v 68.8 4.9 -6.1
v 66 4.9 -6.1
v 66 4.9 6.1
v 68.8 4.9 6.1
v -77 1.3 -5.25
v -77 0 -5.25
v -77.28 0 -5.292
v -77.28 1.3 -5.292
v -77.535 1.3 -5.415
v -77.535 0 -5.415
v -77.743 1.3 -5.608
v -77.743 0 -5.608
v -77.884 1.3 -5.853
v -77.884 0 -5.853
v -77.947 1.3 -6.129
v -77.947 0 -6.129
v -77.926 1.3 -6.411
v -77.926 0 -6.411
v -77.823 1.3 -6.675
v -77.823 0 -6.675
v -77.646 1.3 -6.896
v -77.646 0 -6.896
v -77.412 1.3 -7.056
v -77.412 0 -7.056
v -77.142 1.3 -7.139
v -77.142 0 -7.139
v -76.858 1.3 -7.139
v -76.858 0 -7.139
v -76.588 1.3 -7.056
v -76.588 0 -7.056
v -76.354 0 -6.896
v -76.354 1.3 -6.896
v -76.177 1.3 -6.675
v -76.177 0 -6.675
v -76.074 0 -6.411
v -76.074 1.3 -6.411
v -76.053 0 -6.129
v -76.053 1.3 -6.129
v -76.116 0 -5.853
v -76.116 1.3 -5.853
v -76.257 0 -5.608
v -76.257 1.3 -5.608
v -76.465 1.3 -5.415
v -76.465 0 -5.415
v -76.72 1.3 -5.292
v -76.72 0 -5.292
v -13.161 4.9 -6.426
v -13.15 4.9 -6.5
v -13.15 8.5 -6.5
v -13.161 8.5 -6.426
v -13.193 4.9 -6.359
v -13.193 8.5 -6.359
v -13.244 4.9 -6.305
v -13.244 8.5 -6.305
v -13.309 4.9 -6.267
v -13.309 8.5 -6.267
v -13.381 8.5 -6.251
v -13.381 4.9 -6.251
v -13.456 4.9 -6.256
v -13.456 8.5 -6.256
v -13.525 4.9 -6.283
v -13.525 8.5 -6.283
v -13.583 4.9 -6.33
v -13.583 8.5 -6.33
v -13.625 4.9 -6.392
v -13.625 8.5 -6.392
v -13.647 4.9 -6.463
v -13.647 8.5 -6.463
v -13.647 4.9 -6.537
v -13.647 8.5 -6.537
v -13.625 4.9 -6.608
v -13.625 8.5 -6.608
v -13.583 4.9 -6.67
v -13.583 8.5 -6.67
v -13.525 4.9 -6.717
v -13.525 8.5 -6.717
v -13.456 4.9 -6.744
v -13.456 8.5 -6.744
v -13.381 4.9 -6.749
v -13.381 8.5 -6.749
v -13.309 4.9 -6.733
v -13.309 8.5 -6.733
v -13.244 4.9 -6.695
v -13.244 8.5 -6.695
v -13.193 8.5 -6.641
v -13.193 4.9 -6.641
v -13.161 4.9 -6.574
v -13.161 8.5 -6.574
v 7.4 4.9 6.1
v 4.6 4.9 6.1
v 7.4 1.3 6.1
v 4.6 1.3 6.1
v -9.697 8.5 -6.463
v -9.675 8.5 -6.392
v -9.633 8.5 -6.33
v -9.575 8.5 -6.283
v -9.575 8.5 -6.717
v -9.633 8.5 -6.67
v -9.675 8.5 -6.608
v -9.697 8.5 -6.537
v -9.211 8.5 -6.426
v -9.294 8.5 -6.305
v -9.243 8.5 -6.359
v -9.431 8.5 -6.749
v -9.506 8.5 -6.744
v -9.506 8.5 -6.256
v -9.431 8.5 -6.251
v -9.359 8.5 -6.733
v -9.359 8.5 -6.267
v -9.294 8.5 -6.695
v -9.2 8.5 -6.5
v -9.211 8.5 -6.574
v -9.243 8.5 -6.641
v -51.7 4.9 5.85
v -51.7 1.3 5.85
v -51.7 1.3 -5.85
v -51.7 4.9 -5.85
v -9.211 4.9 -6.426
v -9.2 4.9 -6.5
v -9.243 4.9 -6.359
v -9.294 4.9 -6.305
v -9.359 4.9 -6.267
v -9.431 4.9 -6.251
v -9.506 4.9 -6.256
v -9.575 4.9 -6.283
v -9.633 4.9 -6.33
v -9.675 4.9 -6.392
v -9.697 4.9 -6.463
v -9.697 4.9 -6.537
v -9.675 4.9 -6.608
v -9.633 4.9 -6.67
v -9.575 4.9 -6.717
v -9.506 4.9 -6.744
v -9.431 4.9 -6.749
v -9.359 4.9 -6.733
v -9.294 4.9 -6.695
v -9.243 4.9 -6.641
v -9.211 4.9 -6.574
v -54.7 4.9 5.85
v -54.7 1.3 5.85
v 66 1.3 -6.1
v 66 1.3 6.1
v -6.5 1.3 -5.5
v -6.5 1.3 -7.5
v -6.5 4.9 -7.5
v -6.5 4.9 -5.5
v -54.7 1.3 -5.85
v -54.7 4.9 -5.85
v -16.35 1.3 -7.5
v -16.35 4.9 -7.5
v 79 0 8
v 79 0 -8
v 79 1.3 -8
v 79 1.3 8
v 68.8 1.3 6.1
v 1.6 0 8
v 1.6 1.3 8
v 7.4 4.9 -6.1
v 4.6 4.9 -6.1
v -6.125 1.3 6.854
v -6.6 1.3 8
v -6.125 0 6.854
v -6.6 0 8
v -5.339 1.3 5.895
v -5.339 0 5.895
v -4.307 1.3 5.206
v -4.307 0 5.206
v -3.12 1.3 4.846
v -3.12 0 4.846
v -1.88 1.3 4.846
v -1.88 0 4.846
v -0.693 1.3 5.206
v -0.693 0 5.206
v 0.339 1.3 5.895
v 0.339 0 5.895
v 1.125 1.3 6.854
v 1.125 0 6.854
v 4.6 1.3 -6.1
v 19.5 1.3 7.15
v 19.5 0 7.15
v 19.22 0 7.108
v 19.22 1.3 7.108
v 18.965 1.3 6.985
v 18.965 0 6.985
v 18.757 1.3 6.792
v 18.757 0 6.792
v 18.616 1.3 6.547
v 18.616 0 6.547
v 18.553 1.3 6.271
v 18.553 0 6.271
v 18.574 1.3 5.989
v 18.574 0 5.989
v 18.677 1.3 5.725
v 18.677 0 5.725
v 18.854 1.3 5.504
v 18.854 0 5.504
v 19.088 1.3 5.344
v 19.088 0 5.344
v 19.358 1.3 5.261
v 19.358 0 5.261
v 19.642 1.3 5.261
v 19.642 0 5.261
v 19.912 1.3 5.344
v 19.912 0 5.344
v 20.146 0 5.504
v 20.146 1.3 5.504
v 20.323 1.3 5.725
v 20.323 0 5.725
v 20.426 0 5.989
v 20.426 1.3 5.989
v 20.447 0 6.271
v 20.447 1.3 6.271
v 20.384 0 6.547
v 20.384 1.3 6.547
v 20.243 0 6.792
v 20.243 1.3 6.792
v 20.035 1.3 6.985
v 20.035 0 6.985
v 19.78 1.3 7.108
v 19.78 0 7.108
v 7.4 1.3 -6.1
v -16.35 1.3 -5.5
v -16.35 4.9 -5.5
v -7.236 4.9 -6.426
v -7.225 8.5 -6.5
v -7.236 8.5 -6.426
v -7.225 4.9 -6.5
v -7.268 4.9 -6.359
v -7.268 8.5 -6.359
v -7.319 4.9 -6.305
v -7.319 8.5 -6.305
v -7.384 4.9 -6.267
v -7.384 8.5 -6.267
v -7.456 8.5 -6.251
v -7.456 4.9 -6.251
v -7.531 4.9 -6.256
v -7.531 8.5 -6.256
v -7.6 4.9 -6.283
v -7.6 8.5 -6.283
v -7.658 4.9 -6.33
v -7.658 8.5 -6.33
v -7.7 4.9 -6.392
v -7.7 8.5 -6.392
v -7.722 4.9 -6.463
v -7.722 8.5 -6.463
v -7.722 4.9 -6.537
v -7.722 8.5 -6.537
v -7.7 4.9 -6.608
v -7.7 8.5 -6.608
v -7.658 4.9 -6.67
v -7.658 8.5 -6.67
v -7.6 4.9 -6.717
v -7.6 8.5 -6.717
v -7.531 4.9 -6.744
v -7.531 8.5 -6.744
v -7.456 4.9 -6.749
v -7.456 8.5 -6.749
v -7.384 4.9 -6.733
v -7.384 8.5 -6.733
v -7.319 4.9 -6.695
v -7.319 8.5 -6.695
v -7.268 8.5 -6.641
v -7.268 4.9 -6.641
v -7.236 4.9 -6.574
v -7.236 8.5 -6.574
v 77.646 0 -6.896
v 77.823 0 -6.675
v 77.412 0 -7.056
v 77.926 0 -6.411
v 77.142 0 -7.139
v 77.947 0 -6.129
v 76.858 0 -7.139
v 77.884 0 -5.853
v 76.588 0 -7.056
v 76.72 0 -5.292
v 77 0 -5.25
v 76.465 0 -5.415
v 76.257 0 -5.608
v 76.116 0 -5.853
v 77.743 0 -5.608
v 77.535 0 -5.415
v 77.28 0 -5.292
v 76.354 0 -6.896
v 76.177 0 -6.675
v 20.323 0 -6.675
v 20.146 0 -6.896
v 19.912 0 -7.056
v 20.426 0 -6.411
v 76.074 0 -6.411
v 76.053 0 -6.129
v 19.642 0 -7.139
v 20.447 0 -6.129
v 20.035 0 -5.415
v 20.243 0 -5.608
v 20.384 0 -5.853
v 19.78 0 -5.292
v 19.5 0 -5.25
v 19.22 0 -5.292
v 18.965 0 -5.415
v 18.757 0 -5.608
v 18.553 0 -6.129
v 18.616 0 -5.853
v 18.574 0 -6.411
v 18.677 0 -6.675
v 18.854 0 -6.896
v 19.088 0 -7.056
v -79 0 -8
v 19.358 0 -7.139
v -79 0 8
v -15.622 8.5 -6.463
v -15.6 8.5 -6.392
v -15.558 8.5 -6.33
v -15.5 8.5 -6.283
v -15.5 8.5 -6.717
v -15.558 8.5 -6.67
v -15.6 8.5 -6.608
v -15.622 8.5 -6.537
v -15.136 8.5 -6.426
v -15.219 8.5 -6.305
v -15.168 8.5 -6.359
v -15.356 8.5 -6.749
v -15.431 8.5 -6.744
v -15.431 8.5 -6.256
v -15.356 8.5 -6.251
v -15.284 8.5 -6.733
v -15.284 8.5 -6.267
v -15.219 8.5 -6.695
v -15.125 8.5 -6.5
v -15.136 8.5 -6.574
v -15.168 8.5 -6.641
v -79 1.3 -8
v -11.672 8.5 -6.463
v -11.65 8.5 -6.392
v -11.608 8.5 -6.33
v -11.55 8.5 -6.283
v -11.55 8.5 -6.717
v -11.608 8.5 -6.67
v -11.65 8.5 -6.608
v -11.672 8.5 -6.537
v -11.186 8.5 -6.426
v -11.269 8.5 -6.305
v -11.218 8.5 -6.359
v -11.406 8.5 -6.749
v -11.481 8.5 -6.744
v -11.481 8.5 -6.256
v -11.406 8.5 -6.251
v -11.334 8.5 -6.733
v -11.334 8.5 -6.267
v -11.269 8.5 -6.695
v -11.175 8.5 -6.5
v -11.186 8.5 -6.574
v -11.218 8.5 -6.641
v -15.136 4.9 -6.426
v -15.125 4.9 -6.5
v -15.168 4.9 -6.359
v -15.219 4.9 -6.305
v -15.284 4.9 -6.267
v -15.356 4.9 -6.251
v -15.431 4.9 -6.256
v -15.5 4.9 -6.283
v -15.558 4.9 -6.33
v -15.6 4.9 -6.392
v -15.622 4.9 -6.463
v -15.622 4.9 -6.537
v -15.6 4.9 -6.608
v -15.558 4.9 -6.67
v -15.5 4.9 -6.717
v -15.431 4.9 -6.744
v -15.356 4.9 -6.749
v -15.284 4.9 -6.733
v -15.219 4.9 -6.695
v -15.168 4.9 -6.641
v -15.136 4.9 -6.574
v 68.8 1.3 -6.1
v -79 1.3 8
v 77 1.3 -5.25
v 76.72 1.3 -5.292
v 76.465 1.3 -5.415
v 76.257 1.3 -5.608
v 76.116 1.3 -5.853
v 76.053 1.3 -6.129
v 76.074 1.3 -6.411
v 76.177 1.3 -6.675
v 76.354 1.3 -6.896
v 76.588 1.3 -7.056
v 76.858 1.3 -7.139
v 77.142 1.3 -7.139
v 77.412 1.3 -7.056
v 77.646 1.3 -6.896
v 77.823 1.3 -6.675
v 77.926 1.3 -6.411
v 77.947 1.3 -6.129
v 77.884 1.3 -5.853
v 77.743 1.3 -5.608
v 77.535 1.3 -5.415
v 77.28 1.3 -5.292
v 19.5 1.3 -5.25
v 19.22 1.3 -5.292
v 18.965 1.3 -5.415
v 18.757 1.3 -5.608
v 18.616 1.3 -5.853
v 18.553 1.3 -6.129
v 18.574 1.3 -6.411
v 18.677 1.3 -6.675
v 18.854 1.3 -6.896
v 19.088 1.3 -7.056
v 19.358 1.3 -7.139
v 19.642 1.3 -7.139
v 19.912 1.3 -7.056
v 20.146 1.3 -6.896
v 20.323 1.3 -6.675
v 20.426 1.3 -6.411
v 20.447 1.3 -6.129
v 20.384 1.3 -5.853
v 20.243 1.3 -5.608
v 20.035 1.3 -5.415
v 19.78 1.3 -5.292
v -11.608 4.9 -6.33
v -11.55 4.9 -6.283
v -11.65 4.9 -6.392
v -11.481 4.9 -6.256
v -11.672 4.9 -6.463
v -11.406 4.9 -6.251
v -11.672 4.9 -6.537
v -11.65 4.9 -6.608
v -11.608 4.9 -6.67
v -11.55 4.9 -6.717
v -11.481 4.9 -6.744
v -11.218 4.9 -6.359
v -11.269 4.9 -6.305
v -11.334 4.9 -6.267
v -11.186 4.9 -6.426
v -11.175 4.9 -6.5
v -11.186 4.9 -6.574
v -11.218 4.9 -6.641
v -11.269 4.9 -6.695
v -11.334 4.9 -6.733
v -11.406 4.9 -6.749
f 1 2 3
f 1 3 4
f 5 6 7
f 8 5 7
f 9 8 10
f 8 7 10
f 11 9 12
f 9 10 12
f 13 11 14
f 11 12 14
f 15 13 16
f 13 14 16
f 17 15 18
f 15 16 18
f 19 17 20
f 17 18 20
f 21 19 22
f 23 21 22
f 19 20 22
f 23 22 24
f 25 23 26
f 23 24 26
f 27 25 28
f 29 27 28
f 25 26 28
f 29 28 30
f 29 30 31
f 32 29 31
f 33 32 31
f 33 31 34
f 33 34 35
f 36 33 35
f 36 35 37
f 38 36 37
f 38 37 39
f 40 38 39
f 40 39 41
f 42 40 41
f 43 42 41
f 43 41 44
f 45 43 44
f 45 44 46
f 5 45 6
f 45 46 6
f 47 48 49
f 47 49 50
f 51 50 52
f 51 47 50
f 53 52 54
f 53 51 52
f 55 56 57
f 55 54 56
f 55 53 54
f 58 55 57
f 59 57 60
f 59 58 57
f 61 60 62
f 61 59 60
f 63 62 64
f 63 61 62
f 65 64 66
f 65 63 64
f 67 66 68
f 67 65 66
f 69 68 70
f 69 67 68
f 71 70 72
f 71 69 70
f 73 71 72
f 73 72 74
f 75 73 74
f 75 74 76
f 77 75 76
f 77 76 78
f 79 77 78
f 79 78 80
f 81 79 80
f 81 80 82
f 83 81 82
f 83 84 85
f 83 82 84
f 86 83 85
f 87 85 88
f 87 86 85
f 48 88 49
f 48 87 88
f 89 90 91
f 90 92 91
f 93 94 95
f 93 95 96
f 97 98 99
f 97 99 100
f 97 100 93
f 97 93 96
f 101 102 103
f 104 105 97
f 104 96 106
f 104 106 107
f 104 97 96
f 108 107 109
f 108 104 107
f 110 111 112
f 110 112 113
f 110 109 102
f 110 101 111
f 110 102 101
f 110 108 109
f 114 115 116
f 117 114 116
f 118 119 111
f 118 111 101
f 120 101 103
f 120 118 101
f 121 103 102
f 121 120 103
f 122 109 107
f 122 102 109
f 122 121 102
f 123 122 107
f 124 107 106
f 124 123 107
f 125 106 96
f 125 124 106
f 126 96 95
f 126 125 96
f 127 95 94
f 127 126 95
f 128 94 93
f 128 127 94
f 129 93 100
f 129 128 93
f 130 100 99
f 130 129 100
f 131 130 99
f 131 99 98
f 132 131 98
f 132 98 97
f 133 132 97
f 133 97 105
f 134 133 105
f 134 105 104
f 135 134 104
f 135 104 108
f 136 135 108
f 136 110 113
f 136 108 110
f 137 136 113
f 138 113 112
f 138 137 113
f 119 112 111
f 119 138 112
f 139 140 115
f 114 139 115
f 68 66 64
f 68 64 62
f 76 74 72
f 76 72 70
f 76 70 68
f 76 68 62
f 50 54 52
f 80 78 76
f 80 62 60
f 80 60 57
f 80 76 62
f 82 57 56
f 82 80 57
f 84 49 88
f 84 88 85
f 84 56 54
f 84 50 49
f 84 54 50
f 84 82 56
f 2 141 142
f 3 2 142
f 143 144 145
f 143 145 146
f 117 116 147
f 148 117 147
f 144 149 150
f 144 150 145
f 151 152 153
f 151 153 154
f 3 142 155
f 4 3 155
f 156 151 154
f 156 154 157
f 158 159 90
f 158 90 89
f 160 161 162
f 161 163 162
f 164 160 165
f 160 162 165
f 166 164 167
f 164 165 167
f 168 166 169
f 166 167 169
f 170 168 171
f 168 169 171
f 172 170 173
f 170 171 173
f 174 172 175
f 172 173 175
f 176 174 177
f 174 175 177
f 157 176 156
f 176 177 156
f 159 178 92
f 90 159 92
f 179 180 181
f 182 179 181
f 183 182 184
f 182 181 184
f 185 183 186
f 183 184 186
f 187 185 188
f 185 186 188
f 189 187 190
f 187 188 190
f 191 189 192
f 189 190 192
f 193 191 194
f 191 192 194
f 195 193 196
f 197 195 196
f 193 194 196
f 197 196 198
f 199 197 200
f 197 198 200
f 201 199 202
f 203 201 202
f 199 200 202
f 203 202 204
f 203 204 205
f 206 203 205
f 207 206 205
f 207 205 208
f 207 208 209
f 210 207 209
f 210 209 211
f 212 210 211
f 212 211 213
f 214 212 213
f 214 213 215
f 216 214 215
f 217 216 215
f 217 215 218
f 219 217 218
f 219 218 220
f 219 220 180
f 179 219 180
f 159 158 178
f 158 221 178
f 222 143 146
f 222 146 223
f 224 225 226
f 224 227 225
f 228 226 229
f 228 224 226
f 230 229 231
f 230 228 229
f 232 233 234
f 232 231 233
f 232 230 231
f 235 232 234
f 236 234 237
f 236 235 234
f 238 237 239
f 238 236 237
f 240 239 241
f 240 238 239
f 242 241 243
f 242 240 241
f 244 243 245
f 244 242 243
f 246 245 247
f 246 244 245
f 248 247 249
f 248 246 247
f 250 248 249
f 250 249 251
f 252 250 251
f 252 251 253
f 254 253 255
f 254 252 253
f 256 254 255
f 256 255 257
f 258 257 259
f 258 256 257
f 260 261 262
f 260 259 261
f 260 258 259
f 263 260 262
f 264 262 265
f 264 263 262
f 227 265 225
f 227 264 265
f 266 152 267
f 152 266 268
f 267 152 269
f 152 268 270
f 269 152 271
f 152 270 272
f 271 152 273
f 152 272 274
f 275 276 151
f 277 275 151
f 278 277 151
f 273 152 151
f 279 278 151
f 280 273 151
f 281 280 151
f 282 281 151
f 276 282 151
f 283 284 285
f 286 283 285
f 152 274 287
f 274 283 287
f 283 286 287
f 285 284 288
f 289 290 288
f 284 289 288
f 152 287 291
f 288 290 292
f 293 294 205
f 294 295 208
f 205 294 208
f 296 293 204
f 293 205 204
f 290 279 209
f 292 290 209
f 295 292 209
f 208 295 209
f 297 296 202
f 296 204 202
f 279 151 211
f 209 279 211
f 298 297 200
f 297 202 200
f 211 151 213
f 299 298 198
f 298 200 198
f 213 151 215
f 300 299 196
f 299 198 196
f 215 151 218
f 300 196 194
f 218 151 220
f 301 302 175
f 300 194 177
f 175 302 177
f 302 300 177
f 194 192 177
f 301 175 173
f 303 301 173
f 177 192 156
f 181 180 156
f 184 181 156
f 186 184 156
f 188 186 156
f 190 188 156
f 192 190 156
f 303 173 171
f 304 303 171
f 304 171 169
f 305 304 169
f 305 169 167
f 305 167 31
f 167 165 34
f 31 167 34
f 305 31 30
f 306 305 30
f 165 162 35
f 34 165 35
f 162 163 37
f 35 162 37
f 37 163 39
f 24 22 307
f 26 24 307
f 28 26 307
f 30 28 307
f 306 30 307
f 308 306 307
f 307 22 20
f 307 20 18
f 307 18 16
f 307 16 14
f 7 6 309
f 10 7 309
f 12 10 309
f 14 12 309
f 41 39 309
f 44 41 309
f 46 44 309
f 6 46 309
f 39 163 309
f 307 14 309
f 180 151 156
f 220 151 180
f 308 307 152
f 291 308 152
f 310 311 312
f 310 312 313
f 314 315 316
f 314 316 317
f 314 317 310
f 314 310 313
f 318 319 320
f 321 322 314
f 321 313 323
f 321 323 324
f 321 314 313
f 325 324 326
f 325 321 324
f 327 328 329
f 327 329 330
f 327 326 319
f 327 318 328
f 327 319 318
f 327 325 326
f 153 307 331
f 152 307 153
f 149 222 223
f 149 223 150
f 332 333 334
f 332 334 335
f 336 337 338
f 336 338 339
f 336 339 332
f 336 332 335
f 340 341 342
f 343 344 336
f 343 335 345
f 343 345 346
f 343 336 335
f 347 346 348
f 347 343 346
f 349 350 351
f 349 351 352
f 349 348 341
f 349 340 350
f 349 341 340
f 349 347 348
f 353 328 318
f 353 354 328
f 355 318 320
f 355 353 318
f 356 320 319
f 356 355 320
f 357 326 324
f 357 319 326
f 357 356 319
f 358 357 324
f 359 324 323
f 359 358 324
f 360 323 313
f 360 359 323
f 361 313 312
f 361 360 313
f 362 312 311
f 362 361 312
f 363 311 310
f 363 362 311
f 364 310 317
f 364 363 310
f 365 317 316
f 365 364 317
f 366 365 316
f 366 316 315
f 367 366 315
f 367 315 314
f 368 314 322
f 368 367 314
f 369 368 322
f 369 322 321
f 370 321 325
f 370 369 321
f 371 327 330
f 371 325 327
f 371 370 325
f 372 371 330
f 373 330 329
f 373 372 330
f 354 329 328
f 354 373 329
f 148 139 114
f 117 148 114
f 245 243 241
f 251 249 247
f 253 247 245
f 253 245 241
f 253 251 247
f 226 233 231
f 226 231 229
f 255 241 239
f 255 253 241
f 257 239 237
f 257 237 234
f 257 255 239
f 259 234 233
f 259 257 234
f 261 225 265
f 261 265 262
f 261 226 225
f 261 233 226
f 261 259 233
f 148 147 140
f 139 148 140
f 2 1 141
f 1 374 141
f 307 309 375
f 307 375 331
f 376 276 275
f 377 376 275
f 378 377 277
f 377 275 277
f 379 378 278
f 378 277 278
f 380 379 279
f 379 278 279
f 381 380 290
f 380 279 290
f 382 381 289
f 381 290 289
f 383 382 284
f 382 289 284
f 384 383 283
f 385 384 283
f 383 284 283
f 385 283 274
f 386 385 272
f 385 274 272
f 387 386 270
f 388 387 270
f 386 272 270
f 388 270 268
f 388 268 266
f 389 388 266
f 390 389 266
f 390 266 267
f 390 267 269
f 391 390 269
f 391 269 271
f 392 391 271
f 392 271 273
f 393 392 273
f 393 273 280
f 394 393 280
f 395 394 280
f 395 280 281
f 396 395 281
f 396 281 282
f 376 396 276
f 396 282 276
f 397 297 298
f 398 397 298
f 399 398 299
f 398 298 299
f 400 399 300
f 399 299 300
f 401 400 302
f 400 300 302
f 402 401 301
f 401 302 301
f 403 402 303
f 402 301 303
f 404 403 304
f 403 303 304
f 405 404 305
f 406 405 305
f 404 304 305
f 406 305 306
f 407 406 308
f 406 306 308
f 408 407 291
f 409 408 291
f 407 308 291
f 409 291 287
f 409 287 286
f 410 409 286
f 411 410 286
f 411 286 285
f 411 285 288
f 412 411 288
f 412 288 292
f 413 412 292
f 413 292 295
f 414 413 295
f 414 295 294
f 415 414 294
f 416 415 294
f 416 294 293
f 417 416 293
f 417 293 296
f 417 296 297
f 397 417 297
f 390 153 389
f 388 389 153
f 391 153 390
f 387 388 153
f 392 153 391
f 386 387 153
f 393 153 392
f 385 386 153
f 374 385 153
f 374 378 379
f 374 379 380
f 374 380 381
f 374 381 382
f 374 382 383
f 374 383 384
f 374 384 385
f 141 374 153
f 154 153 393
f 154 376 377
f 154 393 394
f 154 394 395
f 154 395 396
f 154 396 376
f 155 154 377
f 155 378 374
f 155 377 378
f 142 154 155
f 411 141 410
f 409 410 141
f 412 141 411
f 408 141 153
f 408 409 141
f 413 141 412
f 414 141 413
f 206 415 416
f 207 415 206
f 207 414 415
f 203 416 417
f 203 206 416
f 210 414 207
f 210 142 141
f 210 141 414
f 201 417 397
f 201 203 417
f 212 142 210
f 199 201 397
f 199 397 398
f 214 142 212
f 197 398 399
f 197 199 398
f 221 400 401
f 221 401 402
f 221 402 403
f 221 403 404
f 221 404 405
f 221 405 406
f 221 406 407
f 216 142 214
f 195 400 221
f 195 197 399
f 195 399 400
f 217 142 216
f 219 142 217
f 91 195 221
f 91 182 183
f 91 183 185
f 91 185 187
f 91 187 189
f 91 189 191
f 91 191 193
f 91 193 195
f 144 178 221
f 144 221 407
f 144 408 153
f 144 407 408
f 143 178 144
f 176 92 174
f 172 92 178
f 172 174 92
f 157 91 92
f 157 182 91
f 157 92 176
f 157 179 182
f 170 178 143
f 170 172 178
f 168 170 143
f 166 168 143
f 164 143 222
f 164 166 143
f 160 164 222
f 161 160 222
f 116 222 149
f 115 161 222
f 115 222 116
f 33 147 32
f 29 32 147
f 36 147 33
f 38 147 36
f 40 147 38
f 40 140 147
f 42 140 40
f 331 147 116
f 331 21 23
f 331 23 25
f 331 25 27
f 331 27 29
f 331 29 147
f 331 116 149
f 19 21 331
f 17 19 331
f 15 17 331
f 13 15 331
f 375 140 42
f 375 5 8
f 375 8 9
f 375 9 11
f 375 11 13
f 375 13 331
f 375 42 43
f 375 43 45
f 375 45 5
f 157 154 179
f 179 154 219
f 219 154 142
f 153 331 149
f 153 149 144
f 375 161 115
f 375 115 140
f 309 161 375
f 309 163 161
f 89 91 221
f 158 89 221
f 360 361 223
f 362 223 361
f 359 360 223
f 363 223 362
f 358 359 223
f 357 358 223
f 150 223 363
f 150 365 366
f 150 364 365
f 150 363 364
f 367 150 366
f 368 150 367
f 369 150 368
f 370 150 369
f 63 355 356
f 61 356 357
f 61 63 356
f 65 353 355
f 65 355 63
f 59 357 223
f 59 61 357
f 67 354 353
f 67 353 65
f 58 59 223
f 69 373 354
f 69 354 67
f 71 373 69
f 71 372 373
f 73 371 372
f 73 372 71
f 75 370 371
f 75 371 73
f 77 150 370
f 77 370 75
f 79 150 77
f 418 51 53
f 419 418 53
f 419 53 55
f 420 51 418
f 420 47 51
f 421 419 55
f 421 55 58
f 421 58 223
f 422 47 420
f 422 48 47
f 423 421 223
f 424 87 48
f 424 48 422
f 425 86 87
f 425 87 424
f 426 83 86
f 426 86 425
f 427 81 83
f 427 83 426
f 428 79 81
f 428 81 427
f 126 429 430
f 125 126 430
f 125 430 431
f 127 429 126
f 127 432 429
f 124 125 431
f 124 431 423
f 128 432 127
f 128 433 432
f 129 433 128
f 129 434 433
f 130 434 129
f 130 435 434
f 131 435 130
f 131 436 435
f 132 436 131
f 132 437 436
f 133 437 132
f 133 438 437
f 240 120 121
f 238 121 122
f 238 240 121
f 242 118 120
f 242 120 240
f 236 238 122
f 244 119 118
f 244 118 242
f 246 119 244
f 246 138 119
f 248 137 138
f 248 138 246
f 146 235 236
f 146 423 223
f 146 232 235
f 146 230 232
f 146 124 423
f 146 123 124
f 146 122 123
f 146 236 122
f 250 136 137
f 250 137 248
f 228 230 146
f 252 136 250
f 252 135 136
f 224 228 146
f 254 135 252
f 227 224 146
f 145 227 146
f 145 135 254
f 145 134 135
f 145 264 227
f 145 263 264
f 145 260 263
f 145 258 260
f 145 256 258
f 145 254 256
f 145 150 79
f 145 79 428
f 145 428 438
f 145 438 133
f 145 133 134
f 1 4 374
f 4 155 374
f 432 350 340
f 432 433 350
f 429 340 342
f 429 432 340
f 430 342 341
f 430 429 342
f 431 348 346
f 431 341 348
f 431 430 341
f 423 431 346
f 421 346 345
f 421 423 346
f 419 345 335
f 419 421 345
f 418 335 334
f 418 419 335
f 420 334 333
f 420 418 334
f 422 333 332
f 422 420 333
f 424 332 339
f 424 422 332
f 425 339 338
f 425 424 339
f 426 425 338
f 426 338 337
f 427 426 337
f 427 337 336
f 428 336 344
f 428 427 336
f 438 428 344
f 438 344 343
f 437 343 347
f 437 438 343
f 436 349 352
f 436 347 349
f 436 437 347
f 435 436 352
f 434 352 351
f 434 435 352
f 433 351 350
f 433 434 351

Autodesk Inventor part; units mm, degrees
ref_plane "YZ Plane" through (0, 0, 0) normal (1, 0, 0) x (0, 1, 0)
ref_plane "XZ Plane" through (0, 0, 0) normal (0, 1, 0) x (-1, 0, 0)
ref_plane "XY Plane" through (0, 0, 0) normal (0, 0, 1) x (1, 0, 0)
sketch "Sketch1" plane through (0, 0, 0) normal (0, 1, 0) x (-1, 0, 0)
  line L0 (79, -8) -> (-79, -8)
  line L1 (-79, -8) -> (-79, 8)
  line L2 (79, 8) -> (79, -8)
  line L3 (79, -8) -> (-79, 8) construction
  line L4 (-79, -8) -> (79, 8) construction
  arc A0 (-1.6, 8) -> (6.6, 8) centre (2.5, 9.0266) ccw
  line L5 (0, -8) -> (0, 2.5887)
  line L6 (2.5, 9.0266) -> (2.5, 15.2917) construction
  line L7 (7.7992, 4.8) -> (-2.6665, 4.8) construction
  line L8 (-79, 8) -> (-1.6, 8)
  line L9 (6.6, 8) -> (79, 8)
  point P0 (0, 0)
  dimension "d0" = 158
  dimension "d1" = 16
  dimension "d2" = 76.5
  dimension "d3" = 8.2
  dimension "d5" = 3.2
extrude "Extrusion1" add sketch "Sketch1" along normal blind 1.3
sketch "Sketch2" plane through (0, 1.3, 0) normal (0, 1, 0) x (1, 0, 0)
  line L0 (79, 8) -> (-79, 8) projected
  line L1 (-79, 8) -> (-79, -8) projected
  line L2 (-79, -8) -> (-6.6, -8) projected
  arc A0 (1.6, -8) -> (-6.6, -8) centre (-2.5, -9.0266) ccw projected
  line L3 (1.6, -8) -> (79, -8) projected
  line L4 (79, -8) -> (79, 8) projected
  line L5 (-77, 6.2) -> (77, 6.2) construction
  line L6 (19.5, 6.2) -> (19.5, -6.2) construction
  point P0 (0, 0)
  dimension "d8" = 154
  dimension "d9" = 1.8
  dimension "d10" = 1.8
  dimension "d11" = 57.5
  dimension "d19" = 2
  dimension "d20" = 2
  dimension "d47" = 59.5
hole "Hole1" at (-77, 1.3, -6.2) at (77, 1.3, -6.2) at (19.5, 1.3, -6.2) at (19.5, 1.3, 6.2) direction (0, -1, 0) diameter 1.9 end through all
sketch "Sketch3" plane through (0, 1.3, 0) normal (0, 1, 0) x (1, 0, 0)
  line L0 (-16.35, 7.5) -> (-6.5, 7.5)
  line L1 (-6.5, 7.5) -> (-6.5, 5.5)
  line L2 (-6.5, 5.5) -> (-16.35, 5.5)
  line L3 (-16.35, 5.5) -> (-16.35, 7.5)
  line L4 (-16.35, 7.5) -> (-6.5, 5.5) construction
  line L5 (-6.5, 7.5) -> (-16.35, 5.5) construction
  line L6 (79, 8) -> (-79, 8) projected
  line L7 (-79, 8) -> (-79, -8) projected
  line L8 (-54.7, -5.85) -> (-51.7, -5.85)
  line L9 (-51.7, -5.85) -> (-51.7, 5.85)
  line L10 (-51.7, 5.85) -> (-54.7, 5.85)
  line L11 (-54.7, 5.85) -> (-54.7, -5.85)
  line L12 (-54.7, -5.85) -> (-51.7, 5.85) construction
  line L13 (-51.7, -5.85) -> (-54.7, 5.85) construction
  line L14 (4.6, -6.1) -> (7.4, -6.1)
  line L15 (7.4, -6.1) -> (7.4, 6.1)
  line L16 (7.4, 6.1) -> (4.6, 6.1)
  line L17 (4.6, 6.1) -> (4.6, -6.1)
  line L18 (4.6, -6.1) -> (7.4, 6.1) construction
  line L19 (7.4, -6.1) -> (4.6, 6.1) construction
  line L20 (66, -6.1) -> (68.8, -6.1)
  line L21 (68.8, -6.1) -> (68.8, 6.1)
  line L22 (68.8, 6.1) -> (66, 6.1)
  line L23 (66, 6.1) -> (66, -6.1)
  line L24 (66, -6.1) -> (68.8, 6.1) construction
  line L25 (68.8, -6.1) -> (66, 6.1) construction
  line L26 (6, 0) -> (67.4, 0) construction
  line L27 (79, -8) -> (79, 8) projected
  point P0 (0, 0)
  point P1 (-11.425, 6.5)
  point P2 (-53.2, 0)
  point P3 (-53.2, 0)
  dimension "d21" = 9.85
  dimension "d22" = 2
  dimension "d23" = 0.5
  dimension "d24" = 72.5
  dimension "d25" = 3
  dimension "d26" = 11.7
  dimension "d27" = 2.8
  dimension "d28" = 12.2
  dimension "d29" = 12.2
  dimension "d30" = 2.8
  dimension "d31" = 74.4
  dimension "d32" = 13
  dimension "d33" = 27.3
extrude "Extrusion2" add sketch "Sketch3" along normal blind 3.6
sketch "Sketch4" plane through (0, 4.9, 0) normal (0, 1, 0) x (1, 0, 0)
  line L0 (-6.5, 7.5) -> (-16.35, 7.5) projected
  line L1 (-16.35, 7.5) -> (-16.35, 5.5) projected
  line L2 (-16.35, 5.5) -> (-6.5, 5.5) projected
  line L3 (-6.5, 5.5) -> (-6.5, 7.5) projected
  line L4 (-16.35, 6.5) -> (-6.5, 6.5) construction
  line L5 (-6.5, 7.5) -> (-6.5, 5.5) projected
  circle A0 centre (-15.375, 6.5) radius 0.25
  circle A1 centre (-7.475, 6.5) radius 0.25
  circle A2 centre (-13.4, 6.5) radius 0.25
  circle A3 centre (-11.425, 6.5) radius 0.25
  circle A4 centre (-9.45, 6.5) radius 0.25
  line L6 (-6.5, 5.5) -> (-16.35, 5.5) projected
  line L7 (-11.425, 5.5) -> (-11.425, 4.6298) construction
  point P0 (0, 0)
  dimension "d36" = 0.5
  dimension "d37" = 0.5
  dimension "d38" = 7.9
  dimension "d39" = 0.5
  dimension "d40" = 0.5
  dimension "d41" = 0.5
  dimension "d42" = 1.975
  dimension "d43" = 1.975
  dimension "d44" = 1.975
extrude "Extrusion3" add sketch "Sketch4" along normal blind 3.6 contours A0 | A1 | A2 | A3 | A4
equation "\"d10\" = d9"
equation "\"d29\" = d28"
equation "\"d30\" = d27"
equation "\"d42\" = 0.25 * d38"
equation "\"d43\" = d42"
equation "\"d44\" = d43"
properties part number "xtion_mainboard"
